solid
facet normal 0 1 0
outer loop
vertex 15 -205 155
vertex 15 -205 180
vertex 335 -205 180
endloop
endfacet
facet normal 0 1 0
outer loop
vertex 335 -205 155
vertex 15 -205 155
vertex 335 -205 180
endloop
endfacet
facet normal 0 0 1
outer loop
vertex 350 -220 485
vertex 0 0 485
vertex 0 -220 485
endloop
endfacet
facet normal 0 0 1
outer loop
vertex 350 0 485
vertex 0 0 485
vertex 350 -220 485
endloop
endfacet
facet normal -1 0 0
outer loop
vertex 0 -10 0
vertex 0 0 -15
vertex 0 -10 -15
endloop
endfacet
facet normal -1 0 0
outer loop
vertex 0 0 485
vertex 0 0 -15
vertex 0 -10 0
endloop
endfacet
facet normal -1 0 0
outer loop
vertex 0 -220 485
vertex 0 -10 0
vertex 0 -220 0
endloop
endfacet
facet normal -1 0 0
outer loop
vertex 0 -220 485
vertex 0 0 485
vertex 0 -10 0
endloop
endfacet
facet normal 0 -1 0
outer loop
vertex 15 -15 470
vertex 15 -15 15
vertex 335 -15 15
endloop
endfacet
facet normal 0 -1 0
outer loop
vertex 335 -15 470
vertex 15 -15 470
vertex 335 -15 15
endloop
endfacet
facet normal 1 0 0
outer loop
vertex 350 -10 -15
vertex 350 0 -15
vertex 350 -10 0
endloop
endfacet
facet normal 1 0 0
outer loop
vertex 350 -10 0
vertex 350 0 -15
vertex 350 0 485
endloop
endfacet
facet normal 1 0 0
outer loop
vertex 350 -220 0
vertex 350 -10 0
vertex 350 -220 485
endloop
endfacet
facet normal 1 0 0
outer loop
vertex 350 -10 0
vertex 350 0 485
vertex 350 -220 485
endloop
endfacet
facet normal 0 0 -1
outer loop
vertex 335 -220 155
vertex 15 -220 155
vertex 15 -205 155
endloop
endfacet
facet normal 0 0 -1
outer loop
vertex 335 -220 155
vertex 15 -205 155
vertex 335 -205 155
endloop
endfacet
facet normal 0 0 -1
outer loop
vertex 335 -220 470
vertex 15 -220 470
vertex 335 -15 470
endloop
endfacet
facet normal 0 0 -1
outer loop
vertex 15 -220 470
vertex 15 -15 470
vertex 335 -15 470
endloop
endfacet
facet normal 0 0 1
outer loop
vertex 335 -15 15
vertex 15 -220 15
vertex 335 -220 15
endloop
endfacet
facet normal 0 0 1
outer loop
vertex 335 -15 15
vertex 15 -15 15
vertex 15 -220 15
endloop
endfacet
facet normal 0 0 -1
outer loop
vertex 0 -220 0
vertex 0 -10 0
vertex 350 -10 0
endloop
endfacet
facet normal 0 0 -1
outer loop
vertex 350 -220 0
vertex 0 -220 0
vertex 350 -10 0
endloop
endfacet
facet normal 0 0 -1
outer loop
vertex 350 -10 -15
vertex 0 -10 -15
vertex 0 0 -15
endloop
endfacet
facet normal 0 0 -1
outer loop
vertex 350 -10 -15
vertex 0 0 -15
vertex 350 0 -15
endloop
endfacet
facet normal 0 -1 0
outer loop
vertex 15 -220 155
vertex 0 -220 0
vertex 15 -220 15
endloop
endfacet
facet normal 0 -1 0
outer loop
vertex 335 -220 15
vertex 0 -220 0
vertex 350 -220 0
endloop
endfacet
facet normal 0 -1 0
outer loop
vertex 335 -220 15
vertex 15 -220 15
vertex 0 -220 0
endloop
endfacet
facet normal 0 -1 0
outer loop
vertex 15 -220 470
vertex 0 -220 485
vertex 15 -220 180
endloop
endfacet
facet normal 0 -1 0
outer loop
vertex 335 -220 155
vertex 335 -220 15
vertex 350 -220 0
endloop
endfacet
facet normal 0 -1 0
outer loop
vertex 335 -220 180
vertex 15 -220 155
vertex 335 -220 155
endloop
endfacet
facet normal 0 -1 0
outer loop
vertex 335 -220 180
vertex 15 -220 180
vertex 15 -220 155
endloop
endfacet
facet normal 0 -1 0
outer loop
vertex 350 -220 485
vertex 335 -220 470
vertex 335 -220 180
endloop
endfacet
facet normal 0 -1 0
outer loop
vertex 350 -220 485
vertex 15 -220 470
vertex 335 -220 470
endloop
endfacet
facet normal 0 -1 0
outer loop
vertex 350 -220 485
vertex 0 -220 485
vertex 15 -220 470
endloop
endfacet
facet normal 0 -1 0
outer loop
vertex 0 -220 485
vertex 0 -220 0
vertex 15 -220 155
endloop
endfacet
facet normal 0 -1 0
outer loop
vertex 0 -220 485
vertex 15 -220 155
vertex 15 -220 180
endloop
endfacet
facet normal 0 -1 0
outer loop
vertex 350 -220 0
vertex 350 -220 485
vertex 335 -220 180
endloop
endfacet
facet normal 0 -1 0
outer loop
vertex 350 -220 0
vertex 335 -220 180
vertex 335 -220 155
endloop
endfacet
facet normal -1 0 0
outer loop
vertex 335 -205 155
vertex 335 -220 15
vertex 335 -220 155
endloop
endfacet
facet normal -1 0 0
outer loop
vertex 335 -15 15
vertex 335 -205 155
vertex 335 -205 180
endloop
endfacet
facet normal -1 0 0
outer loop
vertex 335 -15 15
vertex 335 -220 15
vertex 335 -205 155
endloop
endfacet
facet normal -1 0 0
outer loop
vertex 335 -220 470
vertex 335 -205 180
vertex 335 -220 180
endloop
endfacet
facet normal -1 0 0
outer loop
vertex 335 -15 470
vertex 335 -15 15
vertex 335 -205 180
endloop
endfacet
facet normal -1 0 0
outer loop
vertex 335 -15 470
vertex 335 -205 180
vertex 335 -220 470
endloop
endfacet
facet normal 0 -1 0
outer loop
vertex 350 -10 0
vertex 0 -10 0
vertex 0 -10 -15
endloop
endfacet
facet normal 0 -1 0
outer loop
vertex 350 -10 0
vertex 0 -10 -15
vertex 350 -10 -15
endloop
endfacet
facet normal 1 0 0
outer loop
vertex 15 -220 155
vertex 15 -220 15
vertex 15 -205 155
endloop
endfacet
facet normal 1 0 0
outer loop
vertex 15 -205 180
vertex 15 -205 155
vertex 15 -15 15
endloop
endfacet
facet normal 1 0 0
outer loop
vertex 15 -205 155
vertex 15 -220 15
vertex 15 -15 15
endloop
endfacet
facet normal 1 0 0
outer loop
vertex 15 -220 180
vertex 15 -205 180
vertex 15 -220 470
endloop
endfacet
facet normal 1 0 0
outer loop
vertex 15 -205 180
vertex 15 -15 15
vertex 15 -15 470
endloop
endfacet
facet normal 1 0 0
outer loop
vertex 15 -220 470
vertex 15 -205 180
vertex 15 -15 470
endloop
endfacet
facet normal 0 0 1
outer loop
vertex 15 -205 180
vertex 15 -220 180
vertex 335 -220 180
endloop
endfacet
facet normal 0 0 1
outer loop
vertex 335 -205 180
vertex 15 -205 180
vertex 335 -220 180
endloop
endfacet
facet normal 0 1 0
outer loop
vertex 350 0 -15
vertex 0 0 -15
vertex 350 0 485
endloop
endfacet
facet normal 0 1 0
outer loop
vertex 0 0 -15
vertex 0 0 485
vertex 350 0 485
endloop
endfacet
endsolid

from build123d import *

# Parameters (mm, degrees)
F0_W     = 350
F0_H     = 485
F1_DEPTH = 220
F2_T     = -15
F3_W     = 320
F3_H     = 25
F4_DEPTH = 15
F5_W     = 350
F5_H     = 10
F6_DEPTH = 15


with BuildPart() as f1:
    # F0 (on Front) → F1 (new body)
    with BuildSketch(Plane.XZ):
        with Locations((175, 242.5)):
            Rectangle(F0_W, F0_H)
    extrude(amount=F1_DEPTH)

    # F2
    f2_openings = [f1.faces().sort_by_distance(p)[0] for p in [
        (175, -220, 242.5),
    ]]
    offset(amount=F2_T, openings=f2_openings)

    # F3 (on face) → F4 (join)
    with BuildSketch(Plane.XZ.offset(220)):
        with Locations((175, 167.5)):
            Rectangle(F3_W, F3_H)
    extrude(amount=-F4_DEPTH)

    # F5 (on face) → F6 (join)
    with BuildSketch(Plane(origin=(0, 0, 0), x_dir=(1, 0, 0), z_dir=(0, 0, -1))):
        with Locations((175, 5)):
            Rectangle(F5_W, F5_H)
    extrude(amount=F6_DEPTH)


solid = f1.part
